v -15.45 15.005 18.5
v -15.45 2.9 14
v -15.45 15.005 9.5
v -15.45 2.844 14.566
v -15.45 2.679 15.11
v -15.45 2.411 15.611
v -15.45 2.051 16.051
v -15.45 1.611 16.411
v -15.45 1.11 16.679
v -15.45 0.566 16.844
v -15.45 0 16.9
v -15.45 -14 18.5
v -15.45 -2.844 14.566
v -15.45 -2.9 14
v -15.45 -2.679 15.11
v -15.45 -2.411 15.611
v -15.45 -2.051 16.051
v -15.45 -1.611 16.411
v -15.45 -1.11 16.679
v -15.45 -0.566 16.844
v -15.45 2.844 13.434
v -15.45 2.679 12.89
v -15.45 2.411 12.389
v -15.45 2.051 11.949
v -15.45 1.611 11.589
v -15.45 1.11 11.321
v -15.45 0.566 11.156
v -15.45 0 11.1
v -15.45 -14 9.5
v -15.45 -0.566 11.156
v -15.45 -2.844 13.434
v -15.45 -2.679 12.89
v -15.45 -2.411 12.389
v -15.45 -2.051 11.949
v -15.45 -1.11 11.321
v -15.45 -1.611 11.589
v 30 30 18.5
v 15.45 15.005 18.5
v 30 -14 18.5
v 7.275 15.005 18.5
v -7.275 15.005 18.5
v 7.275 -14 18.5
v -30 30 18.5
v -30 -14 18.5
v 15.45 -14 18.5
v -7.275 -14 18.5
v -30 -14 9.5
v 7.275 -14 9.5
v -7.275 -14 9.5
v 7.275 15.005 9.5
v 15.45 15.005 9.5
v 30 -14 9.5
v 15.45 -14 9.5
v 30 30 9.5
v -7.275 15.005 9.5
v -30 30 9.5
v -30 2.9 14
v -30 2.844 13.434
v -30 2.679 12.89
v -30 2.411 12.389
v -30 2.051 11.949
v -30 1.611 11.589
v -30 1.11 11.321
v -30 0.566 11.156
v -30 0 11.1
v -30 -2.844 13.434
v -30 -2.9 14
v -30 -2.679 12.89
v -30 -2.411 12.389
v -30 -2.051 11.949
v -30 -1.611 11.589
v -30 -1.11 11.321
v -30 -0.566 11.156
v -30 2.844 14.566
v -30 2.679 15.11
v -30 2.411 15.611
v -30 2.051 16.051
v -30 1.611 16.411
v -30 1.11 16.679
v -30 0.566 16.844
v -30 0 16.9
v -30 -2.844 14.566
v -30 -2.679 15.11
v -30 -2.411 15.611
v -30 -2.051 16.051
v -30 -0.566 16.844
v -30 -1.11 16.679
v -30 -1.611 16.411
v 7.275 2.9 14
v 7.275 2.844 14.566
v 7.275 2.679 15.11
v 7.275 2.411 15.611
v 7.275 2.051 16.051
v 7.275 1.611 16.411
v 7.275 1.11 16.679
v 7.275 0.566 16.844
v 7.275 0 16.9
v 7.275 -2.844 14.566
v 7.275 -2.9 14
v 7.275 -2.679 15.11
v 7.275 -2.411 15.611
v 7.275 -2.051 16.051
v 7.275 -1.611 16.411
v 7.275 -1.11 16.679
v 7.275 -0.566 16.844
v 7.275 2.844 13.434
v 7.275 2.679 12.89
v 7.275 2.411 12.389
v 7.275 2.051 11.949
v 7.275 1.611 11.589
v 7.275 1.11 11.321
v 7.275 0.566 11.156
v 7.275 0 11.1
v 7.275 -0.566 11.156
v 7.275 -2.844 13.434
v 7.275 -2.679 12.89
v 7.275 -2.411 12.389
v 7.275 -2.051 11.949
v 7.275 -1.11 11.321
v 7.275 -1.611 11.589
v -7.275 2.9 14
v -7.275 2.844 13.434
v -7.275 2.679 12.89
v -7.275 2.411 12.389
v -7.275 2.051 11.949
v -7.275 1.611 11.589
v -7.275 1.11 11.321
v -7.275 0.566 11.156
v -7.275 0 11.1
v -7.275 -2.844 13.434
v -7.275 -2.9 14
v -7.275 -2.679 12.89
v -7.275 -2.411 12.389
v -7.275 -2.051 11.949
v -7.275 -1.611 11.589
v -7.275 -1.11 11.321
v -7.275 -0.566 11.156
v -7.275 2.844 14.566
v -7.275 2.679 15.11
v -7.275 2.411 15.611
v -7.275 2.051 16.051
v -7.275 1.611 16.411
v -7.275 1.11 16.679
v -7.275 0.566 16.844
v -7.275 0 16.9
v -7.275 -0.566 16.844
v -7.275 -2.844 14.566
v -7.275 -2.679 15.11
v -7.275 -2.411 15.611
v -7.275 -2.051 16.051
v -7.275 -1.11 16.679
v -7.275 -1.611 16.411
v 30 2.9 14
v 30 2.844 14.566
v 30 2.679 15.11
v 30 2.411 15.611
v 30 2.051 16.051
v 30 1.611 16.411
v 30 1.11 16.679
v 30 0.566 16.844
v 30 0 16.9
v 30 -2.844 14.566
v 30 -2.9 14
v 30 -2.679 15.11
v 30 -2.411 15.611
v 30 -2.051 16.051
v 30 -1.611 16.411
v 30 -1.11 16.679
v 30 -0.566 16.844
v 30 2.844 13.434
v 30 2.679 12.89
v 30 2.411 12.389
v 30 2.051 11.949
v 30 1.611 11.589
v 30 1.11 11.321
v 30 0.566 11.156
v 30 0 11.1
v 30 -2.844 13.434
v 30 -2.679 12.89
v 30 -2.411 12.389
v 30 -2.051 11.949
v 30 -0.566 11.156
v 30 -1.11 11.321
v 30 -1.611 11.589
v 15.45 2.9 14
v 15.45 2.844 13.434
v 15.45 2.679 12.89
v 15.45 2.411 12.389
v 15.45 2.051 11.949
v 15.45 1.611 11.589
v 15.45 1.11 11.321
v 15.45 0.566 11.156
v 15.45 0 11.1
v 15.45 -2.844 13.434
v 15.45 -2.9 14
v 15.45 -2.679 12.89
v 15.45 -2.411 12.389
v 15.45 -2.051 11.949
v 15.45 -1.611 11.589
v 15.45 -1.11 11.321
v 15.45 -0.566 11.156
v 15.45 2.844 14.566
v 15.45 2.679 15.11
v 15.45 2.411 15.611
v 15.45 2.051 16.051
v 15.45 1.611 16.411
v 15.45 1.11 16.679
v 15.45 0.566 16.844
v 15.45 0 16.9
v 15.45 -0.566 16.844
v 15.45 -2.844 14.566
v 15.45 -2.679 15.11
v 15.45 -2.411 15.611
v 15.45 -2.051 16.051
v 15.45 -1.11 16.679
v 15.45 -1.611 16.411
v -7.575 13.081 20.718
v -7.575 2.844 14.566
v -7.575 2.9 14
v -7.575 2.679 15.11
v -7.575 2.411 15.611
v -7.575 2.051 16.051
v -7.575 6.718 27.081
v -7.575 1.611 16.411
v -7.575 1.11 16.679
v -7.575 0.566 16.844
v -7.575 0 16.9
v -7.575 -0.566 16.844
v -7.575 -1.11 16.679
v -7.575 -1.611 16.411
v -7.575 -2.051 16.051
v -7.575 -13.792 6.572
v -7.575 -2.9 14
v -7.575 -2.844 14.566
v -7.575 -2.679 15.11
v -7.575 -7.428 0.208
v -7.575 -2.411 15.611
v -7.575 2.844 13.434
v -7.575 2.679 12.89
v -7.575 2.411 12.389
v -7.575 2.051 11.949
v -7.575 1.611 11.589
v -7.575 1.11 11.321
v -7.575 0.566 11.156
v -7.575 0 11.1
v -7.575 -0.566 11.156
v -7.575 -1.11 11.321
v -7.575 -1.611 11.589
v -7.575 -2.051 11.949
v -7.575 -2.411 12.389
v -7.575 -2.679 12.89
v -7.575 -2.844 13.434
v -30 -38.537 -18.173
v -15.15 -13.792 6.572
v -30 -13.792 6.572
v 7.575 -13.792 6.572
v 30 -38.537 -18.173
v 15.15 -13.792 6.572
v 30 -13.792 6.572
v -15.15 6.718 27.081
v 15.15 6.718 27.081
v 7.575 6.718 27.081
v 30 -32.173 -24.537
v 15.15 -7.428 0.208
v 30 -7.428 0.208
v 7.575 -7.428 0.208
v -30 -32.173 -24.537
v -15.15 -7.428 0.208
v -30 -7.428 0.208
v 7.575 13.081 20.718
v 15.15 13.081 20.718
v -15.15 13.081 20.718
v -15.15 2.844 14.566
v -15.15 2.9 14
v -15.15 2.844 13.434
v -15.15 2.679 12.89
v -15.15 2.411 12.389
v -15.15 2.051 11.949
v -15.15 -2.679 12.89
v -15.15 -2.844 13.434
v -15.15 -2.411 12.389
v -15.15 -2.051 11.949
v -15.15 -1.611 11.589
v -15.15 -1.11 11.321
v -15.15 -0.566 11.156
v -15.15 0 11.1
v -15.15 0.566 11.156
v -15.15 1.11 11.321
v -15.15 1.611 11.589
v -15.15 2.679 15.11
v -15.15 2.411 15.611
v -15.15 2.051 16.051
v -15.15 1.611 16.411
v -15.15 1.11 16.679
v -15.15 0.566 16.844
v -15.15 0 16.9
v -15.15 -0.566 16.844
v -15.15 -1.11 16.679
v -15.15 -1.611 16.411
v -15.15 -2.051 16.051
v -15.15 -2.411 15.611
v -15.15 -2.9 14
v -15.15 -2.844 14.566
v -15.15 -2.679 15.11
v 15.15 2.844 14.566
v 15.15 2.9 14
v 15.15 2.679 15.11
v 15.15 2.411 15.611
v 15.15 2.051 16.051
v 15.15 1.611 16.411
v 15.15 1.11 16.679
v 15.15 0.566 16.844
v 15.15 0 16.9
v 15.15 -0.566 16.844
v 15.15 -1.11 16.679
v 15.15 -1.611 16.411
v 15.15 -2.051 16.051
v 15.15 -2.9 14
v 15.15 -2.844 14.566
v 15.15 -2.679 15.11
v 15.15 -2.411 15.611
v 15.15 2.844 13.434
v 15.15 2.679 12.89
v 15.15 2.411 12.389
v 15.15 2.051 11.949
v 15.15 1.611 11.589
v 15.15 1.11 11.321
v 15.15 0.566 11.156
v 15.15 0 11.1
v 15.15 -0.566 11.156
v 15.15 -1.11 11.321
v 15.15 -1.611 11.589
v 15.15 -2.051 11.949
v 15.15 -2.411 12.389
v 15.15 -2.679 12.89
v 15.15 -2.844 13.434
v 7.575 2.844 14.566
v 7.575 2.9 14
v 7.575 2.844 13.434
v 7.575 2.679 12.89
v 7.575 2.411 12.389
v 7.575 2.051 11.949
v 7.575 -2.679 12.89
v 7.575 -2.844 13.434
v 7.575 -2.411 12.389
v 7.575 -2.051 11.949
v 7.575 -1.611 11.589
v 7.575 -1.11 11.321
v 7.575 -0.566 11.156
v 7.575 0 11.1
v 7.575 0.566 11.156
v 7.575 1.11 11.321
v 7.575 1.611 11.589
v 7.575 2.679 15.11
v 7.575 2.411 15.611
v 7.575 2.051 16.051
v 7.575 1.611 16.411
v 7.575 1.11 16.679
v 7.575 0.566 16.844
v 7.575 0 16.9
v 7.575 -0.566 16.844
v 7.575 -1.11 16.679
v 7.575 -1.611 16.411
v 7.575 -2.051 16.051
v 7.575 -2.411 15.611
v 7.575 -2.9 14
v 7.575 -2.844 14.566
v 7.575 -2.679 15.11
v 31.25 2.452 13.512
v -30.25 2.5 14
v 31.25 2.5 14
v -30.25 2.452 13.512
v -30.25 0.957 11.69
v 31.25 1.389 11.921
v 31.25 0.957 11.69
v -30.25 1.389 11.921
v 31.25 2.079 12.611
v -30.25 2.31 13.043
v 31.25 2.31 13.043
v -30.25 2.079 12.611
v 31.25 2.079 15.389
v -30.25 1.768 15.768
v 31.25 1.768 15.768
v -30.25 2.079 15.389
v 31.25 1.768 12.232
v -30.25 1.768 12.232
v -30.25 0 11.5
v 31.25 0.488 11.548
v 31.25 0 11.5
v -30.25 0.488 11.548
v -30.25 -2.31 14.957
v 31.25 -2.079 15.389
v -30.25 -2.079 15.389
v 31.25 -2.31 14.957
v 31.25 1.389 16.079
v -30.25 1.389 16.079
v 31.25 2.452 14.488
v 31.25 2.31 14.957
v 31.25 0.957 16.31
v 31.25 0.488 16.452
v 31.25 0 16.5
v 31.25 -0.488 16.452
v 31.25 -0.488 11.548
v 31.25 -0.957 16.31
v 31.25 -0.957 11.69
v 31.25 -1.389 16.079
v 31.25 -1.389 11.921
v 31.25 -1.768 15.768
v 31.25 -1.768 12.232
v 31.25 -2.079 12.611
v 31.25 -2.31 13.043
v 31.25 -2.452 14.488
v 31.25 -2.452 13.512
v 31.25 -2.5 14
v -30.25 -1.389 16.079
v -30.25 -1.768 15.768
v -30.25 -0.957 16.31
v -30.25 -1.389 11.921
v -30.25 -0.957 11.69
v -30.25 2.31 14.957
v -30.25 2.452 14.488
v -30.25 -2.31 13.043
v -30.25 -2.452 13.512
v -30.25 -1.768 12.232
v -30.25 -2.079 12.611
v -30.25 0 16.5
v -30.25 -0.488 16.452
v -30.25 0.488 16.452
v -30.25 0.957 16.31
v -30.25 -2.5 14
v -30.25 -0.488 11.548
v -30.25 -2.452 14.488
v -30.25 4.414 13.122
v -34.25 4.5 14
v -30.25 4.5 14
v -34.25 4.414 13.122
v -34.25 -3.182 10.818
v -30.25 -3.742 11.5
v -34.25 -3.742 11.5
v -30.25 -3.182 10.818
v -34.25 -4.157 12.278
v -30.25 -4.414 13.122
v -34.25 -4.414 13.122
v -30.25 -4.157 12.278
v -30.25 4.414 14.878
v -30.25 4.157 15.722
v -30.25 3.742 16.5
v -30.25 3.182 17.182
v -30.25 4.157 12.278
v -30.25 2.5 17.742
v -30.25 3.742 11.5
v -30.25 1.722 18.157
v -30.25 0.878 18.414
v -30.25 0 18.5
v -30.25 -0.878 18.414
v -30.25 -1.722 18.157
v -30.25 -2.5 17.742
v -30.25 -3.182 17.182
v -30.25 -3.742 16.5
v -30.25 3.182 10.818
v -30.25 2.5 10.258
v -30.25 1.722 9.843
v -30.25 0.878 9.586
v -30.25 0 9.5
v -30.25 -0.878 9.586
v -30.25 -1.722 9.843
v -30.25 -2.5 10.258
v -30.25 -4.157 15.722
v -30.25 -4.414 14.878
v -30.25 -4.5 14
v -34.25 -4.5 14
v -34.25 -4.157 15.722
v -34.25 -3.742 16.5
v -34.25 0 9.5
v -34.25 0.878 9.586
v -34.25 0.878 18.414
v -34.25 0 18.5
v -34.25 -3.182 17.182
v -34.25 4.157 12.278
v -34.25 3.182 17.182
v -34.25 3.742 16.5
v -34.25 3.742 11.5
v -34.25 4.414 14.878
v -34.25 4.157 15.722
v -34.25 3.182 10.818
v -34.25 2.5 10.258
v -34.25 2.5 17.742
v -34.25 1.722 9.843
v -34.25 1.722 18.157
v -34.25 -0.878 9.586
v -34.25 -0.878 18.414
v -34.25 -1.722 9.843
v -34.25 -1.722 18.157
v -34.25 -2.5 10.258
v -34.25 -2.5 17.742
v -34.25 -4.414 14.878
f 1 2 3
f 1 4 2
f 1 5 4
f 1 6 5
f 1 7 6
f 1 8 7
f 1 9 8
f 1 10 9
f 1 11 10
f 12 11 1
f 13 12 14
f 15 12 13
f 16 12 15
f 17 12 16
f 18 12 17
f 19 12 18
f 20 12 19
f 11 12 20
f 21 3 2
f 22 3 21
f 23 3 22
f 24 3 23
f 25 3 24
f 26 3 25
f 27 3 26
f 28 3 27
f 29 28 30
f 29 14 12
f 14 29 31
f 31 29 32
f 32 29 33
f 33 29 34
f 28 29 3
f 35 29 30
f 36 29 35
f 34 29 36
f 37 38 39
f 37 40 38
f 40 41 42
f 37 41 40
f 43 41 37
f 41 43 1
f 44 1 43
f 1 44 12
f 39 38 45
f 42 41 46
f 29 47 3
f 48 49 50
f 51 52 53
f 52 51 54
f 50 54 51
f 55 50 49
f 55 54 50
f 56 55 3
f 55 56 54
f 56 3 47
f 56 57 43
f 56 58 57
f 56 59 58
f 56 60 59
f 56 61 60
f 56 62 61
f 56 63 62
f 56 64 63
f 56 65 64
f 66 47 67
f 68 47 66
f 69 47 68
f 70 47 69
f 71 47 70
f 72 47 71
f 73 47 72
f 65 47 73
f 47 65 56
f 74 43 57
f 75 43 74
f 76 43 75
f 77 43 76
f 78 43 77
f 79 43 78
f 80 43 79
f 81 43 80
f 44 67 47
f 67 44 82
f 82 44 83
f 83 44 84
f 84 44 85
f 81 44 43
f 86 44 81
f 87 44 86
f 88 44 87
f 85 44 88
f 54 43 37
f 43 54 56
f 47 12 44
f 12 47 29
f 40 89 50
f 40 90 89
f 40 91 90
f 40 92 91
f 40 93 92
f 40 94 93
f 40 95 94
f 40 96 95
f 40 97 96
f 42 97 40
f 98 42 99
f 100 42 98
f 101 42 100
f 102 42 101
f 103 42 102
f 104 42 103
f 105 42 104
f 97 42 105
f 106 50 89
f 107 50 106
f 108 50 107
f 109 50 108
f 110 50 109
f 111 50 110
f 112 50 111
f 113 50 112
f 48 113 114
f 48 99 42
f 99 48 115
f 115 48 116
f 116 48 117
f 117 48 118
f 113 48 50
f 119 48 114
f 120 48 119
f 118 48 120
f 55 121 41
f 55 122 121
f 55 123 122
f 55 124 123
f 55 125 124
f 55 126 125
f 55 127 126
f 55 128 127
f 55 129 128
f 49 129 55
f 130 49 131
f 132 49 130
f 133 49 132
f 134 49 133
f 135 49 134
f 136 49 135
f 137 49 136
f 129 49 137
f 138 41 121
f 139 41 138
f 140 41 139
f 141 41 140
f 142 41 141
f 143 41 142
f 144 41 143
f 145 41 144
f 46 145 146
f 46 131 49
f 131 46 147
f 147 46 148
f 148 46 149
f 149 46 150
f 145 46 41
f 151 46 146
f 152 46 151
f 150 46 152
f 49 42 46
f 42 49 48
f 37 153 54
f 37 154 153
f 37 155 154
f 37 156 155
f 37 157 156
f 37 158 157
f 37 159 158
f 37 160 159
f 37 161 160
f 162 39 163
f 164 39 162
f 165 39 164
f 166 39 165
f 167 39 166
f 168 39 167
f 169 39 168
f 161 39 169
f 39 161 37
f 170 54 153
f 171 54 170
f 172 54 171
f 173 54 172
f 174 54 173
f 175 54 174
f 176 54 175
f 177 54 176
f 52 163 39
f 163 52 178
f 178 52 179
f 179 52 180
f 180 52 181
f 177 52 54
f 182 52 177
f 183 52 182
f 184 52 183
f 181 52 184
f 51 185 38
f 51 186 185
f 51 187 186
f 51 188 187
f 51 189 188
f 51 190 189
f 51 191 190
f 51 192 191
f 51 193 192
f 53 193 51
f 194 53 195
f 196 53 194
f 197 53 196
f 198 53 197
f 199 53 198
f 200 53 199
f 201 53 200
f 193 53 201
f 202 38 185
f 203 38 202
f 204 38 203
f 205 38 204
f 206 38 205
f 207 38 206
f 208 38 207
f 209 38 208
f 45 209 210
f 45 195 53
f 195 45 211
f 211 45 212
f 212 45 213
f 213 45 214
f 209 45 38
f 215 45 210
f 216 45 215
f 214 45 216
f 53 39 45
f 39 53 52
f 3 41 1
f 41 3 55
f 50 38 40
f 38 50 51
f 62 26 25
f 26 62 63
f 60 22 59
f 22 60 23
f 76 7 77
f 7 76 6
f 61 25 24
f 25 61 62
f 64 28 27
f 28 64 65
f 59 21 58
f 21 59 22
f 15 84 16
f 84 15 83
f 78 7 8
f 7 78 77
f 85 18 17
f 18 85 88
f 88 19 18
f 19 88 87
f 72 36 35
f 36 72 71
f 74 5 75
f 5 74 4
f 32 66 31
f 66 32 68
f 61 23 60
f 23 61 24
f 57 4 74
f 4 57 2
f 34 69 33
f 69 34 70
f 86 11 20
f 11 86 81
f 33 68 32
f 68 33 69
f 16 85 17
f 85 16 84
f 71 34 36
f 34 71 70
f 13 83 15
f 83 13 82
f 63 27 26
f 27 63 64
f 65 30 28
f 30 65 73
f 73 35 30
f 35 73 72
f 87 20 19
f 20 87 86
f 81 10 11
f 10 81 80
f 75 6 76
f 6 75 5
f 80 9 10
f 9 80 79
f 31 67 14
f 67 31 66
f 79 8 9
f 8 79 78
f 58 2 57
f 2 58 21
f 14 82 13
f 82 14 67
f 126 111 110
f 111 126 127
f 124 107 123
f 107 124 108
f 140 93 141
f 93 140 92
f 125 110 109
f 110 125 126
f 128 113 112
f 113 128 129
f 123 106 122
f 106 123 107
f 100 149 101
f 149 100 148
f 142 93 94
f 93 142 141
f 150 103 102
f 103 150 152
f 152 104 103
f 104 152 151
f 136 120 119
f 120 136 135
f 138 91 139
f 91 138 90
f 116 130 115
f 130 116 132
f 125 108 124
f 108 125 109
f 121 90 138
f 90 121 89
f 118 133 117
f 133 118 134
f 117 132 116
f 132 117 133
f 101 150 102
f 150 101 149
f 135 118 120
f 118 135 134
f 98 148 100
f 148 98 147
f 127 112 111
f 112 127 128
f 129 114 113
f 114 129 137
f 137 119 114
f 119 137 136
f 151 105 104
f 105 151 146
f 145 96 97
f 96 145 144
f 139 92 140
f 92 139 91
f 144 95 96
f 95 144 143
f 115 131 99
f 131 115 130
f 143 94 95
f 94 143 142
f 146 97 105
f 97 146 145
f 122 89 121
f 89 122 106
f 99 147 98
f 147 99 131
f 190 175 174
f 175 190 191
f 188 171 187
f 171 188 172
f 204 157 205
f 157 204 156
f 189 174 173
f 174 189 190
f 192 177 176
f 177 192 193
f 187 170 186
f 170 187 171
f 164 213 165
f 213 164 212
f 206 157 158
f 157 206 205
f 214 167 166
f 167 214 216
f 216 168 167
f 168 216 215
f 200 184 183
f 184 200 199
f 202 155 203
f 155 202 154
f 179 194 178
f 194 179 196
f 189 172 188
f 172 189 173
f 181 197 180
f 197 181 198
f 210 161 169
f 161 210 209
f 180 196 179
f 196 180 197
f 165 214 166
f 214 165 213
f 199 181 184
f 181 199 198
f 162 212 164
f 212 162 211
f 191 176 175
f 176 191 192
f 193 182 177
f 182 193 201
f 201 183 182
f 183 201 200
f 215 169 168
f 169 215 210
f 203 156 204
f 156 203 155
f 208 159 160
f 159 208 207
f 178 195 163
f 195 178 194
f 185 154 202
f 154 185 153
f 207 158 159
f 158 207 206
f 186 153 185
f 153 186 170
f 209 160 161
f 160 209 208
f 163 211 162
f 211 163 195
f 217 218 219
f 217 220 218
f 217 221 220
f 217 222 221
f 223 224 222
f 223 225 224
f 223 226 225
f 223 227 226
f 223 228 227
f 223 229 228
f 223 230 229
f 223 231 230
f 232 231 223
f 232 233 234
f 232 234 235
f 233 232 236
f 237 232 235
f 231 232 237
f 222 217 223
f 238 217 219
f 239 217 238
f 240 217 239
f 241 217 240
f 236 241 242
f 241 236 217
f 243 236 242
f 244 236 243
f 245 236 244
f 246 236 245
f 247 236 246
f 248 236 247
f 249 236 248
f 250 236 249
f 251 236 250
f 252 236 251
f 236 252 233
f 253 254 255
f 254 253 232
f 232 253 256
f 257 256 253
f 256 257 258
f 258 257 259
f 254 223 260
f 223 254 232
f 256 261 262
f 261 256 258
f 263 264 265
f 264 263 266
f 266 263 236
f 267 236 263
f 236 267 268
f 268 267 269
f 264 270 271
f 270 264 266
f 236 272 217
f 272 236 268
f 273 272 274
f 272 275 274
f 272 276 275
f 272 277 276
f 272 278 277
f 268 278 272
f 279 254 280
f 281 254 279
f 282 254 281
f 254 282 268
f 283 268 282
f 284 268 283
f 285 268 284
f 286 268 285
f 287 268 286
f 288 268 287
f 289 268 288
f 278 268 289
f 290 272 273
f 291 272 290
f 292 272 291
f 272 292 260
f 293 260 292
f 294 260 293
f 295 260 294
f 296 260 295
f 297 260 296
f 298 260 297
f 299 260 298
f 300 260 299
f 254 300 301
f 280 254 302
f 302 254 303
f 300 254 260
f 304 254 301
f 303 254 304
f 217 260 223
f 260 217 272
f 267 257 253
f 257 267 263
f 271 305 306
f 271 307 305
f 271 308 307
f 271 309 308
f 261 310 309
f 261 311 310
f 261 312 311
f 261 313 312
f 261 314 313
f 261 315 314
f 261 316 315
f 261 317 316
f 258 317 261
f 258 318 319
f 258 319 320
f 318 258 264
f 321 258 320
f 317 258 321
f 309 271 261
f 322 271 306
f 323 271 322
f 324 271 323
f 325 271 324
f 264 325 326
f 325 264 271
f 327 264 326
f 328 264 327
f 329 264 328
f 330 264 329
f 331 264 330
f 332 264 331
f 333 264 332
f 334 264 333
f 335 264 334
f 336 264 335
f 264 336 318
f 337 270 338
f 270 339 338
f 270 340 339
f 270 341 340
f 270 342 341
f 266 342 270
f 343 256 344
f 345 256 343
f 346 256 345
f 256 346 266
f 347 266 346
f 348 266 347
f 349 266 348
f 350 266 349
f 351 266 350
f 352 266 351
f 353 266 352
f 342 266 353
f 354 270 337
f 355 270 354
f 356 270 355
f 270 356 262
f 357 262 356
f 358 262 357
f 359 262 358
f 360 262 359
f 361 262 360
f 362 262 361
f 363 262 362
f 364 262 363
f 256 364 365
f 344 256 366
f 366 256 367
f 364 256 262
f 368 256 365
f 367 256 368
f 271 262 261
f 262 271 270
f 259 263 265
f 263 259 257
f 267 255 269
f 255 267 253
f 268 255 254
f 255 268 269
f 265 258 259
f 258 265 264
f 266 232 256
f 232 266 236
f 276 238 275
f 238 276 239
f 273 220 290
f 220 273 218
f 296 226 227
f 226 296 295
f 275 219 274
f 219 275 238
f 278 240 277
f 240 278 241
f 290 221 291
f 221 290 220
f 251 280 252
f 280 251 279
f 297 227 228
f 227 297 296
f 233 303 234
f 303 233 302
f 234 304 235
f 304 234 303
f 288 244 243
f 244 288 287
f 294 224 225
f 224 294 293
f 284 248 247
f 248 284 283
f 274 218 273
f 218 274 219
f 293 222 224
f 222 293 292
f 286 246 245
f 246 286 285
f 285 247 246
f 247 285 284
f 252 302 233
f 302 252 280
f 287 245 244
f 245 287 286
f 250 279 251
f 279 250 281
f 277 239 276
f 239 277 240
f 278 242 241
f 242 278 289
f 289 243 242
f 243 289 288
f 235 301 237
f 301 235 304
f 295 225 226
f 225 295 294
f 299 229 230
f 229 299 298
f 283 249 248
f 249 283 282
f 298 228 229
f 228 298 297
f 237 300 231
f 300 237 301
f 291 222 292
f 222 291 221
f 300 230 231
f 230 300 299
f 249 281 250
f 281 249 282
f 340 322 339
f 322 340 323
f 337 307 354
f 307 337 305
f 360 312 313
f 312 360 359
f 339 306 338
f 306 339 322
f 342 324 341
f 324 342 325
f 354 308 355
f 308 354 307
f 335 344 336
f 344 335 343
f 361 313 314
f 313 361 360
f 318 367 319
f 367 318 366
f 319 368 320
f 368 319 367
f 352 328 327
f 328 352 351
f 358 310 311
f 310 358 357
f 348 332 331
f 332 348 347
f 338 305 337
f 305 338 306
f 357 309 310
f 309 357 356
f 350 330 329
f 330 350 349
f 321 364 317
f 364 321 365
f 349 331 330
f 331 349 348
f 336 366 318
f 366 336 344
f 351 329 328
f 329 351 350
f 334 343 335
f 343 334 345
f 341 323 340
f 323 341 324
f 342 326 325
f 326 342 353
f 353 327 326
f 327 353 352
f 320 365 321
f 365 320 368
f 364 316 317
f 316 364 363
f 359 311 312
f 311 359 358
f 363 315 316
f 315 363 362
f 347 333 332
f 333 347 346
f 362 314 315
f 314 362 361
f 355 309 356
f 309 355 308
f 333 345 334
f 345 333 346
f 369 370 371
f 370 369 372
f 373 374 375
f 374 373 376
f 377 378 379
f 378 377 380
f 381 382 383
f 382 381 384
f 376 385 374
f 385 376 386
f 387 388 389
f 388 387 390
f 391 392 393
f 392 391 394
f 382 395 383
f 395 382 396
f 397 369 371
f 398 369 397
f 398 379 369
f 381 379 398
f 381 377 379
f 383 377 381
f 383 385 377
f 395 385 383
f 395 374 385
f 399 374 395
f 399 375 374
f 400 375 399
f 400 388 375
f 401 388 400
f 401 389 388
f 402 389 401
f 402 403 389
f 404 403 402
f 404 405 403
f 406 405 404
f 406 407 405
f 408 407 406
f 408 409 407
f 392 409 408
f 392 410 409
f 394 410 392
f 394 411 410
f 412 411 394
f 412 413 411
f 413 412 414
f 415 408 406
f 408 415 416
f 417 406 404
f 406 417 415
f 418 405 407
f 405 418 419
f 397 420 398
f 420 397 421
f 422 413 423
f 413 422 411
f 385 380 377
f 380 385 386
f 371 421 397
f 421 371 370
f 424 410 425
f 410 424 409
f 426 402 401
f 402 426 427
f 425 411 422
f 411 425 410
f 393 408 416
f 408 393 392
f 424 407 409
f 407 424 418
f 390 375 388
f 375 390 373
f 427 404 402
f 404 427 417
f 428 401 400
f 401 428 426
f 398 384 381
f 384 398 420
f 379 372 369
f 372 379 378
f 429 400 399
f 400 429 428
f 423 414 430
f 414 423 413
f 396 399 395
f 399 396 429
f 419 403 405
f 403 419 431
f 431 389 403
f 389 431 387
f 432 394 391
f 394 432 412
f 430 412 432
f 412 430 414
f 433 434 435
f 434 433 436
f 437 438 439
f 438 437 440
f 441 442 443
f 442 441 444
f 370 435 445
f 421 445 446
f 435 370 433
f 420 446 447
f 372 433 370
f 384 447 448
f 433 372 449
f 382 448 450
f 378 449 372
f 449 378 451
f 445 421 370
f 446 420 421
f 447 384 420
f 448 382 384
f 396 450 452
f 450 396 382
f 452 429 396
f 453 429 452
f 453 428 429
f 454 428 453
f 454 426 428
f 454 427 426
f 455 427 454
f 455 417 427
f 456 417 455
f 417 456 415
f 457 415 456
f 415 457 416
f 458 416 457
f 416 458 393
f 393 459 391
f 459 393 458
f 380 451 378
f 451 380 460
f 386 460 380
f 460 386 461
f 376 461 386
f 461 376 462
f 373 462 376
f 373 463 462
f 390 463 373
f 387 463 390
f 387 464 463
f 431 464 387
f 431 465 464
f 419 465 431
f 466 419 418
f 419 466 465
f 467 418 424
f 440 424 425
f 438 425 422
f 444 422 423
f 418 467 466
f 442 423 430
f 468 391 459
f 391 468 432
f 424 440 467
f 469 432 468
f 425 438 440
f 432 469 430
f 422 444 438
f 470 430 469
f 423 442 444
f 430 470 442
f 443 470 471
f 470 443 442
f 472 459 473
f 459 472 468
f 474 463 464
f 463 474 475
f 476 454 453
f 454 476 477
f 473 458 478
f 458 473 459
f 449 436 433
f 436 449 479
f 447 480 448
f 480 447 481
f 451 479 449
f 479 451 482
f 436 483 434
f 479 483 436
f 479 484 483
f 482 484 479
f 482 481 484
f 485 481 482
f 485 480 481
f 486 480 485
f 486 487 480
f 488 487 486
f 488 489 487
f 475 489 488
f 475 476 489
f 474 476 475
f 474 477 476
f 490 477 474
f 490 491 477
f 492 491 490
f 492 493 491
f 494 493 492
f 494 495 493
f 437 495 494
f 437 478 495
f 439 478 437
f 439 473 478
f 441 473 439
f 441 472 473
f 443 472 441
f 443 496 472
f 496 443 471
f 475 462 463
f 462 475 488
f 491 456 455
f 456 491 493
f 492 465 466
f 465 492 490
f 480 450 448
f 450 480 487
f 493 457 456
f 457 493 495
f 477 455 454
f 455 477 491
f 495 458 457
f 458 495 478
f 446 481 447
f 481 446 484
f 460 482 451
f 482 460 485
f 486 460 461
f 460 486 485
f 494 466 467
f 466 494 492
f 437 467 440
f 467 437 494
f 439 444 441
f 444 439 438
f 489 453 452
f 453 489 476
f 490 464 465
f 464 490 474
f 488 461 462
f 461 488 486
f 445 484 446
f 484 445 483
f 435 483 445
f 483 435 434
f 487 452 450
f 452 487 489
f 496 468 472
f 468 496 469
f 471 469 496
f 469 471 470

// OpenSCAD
$fn = 32;

// ------------------------------------------------------------------------
// Butt hinge: hinge 60 mm, leaf swung 45 deg
// Every part is its own module, assembly() places every instance.
// ------------------------------------------------------------------------

// --- part 1 ---
module hinge_base() {
  difference() {
    union() {
      translate([-30, -14, -4.5]) cube([14.55, 44, 9]);
      translate([-7.275, -14, -4.5]) cube([14.55, 44, 9]);
      translate([15.45, -14, -4.5]) cube([14.55, 44, 9]);
      translate([-30, 15.005, -4.5]) cube([60, 14.995, 9]);
    }
    translate([-22.725, 0, 0]) rotate([0, 90, 0]) cylinder(h = 16.55, d = 5.8, center = true);
    translate([0, 0, 0]) rotate([0, 90, 0]) cylinder(h = 16.55, d = 5.8, center = true);
    translate([22.725, 0, 0]) rotate([0, 90, 0]) cylinder(h = 16.55, d = 5.8, center = true);
  }
}

// --- part 2 ---
module hinge_mover() {
  difference() {
    union() {
      translate([-15.15, -50, -4.5]) cube([7.575, 64, 9]);
      translate([7.575, -50, -4.5]) cube([7.575, 64, 9]);
      translate([-30, -50, -4.5]) cube([60, 34.995, 9]);
    }
    translate([-11.362, 0, 0]) rotate([0, 90, 0]) cylinder(h = 9.575, d = 5.8, center = true);
    translate([11.362, 0, 0]) rotate([0, 90, 0]) cylinder(h = 9.575, d = 5.8, center = true);
  }
}

// --- part 3 ---
module hinge_pin() {
  rotate([0, 90, 0]) cylinder(h = 62.5, d = 5, center = true);
  translate([-34.25, 0, 0]) rotate([0, 90, 0]) cylinder(h = 4, d = 9);
}

// --- assembly ---
module assembly() {
  color([0.80, 0.24, 0.20]) translate([0, 0, 14]) rotate([0, 0, 0]) hinge_base();
  color([0.20, 0.45, 0.75]) translate([0, 0, 14]) rotate([45, 0, 0]) hinge_mover();
  color([0.25, 0.62, 0.32]) translate([0, 0, 14]) rotate([0, 0, 0]) hinge_pin();
}

assembly();
